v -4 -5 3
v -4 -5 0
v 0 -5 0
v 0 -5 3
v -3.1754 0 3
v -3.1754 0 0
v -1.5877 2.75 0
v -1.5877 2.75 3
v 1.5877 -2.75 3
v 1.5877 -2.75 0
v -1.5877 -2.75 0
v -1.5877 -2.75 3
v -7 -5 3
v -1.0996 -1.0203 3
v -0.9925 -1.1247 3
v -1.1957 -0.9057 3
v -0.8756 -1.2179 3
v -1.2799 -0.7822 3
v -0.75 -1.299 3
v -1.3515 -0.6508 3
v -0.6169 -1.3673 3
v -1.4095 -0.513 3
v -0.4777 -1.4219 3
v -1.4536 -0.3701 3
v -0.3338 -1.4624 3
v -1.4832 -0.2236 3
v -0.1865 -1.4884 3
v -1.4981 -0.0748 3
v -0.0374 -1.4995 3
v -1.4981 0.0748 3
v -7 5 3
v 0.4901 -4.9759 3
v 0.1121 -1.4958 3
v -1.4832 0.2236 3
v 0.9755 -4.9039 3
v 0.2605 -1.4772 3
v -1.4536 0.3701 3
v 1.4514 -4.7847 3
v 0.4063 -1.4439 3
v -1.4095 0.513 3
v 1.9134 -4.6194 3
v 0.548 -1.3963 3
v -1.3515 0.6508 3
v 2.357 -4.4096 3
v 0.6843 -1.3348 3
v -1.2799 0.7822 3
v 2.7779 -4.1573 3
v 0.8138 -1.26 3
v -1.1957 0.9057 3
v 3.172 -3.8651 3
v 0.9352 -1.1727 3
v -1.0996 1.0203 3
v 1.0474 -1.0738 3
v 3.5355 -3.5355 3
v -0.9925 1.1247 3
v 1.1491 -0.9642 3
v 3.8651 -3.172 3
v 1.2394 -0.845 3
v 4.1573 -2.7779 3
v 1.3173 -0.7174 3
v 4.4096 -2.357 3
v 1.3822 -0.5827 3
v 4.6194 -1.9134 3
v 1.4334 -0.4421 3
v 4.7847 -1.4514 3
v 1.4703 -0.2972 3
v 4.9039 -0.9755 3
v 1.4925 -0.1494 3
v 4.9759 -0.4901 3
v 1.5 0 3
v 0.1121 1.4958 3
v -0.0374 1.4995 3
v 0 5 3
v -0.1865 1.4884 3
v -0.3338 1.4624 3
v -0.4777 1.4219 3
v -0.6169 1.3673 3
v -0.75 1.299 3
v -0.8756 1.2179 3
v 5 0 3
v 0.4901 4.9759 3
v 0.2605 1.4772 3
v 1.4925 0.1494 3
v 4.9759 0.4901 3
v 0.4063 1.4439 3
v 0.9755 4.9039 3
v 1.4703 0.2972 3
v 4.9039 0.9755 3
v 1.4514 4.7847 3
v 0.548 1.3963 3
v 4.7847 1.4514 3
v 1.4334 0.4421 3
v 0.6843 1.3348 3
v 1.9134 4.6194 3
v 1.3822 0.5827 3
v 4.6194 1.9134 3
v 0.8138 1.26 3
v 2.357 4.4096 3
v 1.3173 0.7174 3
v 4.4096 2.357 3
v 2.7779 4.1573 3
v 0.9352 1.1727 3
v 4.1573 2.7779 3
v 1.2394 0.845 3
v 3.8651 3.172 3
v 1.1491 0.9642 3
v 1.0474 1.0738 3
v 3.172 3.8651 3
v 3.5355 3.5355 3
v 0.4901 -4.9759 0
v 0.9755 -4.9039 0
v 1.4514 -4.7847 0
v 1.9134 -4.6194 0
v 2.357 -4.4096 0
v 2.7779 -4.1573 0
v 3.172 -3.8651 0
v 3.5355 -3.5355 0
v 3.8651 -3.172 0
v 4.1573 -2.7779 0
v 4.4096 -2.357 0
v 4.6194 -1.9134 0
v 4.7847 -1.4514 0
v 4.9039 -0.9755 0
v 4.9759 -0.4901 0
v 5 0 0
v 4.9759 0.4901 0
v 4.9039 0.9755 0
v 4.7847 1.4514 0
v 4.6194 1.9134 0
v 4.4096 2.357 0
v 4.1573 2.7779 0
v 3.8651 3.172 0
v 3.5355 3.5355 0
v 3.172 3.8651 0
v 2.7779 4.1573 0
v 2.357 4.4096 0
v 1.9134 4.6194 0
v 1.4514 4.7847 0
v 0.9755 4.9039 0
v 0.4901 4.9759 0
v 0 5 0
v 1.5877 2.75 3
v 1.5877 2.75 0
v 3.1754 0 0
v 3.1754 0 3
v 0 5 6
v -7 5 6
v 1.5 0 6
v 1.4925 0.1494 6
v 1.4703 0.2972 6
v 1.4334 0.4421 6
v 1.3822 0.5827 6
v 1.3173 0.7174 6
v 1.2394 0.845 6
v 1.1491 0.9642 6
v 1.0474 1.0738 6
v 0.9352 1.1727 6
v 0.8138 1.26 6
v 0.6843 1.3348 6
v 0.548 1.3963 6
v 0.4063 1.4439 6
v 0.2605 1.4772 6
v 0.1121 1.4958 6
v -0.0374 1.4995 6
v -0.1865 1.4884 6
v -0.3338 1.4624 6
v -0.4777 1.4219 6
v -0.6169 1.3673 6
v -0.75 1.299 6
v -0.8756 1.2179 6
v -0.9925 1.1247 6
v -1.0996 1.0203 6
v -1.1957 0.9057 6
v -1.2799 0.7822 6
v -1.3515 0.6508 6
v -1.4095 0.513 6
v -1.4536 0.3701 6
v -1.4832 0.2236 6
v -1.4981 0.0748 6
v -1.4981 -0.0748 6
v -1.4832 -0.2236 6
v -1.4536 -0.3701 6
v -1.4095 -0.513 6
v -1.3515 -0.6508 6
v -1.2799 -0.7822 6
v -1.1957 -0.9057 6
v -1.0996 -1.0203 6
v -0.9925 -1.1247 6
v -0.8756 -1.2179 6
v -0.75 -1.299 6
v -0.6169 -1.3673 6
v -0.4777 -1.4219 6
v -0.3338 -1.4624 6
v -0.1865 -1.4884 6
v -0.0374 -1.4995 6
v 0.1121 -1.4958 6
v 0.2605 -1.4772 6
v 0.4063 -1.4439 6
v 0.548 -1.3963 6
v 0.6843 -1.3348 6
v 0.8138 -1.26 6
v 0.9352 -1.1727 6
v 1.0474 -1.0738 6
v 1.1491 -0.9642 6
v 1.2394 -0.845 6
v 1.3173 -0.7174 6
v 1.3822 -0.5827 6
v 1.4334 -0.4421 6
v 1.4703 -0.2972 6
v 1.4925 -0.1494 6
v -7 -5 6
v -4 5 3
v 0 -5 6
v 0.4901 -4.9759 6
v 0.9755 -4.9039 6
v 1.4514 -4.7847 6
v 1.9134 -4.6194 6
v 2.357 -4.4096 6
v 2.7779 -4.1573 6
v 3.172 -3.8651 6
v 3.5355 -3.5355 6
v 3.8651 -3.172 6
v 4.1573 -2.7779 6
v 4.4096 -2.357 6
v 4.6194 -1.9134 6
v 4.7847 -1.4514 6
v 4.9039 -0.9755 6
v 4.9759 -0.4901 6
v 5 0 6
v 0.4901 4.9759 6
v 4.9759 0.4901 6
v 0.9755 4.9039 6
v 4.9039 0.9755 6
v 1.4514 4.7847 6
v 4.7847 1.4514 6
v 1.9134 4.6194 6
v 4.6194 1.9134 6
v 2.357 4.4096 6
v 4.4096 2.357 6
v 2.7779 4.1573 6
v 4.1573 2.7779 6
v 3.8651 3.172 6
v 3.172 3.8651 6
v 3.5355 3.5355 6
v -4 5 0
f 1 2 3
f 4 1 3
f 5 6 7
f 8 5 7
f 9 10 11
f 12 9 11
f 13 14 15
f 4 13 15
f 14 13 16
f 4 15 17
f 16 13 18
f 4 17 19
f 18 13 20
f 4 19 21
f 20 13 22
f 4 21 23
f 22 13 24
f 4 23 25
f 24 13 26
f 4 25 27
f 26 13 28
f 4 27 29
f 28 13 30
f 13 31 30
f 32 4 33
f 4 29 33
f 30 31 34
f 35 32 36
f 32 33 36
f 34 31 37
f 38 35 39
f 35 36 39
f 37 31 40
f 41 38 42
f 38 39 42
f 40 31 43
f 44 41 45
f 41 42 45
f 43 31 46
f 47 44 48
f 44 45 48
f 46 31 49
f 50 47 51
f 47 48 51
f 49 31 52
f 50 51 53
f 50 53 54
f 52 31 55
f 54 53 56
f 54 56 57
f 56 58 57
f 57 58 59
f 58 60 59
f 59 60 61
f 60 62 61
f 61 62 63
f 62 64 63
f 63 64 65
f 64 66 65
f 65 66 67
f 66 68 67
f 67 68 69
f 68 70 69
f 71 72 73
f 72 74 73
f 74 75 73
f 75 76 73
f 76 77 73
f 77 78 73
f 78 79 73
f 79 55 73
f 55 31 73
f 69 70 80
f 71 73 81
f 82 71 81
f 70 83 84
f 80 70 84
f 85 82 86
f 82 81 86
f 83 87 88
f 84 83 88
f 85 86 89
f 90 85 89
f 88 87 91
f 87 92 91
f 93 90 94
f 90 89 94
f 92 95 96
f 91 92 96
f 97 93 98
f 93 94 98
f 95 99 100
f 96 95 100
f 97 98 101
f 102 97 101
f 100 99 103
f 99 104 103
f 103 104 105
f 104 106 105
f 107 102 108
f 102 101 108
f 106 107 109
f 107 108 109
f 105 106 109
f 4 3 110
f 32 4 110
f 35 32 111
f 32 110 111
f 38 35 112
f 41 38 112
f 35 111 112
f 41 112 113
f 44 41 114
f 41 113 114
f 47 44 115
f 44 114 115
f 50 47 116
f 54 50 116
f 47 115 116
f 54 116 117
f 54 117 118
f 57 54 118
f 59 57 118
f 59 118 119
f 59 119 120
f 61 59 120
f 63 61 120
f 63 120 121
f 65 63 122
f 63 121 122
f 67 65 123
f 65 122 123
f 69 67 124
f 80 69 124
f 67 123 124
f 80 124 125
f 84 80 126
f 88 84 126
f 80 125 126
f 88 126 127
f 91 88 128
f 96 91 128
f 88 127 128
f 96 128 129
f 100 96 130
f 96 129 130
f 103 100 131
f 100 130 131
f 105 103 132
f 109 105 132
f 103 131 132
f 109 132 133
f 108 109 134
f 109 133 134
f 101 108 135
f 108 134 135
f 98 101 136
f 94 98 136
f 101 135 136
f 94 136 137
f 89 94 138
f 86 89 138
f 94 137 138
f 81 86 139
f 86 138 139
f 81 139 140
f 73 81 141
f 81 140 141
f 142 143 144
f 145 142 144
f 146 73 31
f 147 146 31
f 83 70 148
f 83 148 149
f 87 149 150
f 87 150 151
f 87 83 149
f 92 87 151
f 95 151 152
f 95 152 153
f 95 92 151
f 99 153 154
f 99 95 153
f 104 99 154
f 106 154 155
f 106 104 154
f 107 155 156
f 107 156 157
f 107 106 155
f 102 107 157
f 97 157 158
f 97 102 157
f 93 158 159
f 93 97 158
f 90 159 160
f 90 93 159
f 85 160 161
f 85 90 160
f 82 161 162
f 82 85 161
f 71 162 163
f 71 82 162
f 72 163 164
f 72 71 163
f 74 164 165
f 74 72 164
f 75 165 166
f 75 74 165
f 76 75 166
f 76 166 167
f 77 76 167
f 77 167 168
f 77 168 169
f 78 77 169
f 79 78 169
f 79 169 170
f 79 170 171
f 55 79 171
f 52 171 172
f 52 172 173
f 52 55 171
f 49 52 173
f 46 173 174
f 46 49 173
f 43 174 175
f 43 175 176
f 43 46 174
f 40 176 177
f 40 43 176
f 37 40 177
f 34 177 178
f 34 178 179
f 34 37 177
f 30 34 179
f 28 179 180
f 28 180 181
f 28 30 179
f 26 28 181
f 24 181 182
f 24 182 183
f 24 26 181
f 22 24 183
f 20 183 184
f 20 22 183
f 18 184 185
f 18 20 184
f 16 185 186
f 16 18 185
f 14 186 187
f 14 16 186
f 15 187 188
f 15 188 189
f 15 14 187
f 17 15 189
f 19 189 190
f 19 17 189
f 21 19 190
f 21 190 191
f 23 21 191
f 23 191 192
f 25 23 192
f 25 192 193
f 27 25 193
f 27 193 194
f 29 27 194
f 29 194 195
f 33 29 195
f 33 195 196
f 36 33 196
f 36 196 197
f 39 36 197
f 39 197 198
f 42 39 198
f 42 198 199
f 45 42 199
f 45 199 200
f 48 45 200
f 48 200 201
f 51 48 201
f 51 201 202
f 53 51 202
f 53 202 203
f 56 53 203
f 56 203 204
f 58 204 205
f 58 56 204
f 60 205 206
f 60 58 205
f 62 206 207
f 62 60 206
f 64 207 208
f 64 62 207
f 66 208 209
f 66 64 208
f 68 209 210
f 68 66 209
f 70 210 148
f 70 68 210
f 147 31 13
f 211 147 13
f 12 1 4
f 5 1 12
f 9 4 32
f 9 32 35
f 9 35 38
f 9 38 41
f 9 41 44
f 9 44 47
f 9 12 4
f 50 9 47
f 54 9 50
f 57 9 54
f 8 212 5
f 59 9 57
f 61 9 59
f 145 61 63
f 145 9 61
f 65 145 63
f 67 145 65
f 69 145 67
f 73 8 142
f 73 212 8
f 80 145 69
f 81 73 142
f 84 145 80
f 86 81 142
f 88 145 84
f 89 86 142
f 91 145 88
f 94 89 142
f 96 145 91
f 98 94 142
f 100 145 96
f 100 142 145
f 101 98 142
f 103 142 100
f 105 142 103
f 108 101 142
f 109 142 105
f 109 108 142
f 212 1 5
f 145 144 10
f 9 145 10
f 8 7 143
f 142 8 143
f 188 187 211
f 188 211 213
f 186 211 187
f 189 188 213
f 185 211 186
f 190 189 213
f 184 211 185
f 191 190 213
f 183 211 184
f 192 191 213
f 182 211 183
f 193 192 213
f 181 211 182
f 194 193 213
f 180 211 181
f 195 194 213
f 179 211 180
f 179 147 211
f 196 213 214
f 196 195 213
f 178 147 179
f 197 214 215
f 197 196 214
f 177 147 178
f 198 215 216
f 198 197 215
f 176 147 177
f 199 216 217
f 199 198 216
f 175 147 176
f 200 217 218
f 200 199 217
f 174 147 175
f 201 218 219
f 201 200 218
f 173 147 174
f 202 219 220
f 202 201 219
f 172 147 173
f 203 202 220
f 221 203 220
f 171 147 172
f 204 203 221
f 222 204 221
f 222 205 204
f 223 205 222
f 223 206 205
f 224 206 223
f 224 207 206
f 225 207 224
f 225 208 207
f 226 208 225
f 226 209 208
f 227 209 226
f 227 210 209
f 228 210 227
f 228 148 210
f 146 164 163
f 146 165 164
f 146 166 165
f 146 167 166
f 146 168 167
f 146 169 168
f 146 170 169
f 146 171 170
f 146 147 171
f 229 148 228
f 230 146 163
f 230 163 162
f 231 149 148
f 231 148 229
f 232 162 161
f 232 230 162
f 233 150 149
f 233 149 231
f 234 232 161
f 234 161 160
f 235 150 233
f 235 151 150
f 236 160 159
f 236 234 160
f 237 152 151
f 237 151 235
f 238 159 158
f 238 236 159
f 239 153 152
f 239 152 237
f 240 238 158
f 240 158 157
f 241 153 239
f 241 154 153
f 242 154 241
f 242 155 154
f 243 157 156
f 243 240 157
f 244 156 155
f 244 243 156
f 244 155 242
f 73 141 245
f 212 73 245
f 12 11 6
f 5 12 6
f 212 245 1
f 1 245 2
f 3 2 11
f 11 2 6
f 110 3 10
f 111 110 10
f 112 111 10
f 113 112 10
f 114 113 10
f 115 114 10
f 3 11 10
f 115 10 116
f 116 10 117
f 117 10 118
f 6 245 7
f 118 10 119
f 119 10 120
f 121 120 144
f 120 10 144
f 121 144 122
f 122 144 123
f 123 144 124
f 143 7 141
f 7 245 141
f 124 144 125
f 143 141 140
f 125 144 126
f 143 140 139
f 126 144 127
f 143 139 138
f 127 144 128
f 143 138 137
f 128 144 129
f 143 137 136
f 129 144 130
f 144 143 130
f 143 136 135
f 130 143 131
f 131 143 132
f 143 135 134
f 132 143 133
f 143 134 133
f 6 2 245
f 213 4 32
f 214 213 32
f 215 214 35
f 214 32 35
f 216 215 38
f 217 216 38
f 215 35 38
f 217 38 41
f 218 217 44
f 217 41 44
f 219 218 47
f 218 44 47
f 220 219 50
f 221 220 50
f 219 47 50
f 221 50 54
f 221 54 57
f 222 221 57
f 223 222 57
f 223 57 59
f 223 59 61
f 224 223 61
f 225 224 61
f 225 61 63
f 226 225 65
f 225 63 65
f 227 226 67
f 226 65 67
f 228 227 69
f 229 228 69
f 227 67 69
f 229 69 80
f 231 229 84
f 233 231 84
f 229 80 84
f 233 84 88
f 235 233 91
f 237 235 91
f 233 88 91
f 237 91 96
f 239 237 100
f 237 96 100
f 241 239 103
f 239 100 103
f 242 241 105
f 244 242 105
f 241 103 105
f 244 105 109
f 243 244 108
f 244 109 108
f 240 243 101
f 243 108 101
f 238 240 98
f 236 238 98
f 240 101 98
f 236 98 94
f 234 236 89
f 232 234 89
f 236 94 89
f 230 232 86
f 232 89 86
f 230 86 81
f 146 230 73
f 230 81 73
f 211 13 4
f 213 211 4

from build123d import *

# Parameters (mm, degrees)
F2_DEPTH = 3
F3_R     = 1.5
F4_DEPTH = 3


with BuildPart() as f2:
    # F1 (on Top) → F2 (new body)
    with BuildSketch(Plane.XY):
        with BuildLine():
            ThreePointArc((0, -5), (5, 0), (0, 5))
            Line((0, 5), (-4, 5))
            Line((-4, 5), (-4, -5))
            Line((-4, -5), (0, -5))
        make_face()
        Polygon((1.5877132403, 2.75), (3.1754264805, 0), (1.5877132403, -2.75), (-1.5877132403, -2.75), (-3.1754264805, 0), (-1.5877132403, 2.75), align=None, mode=Mode.SUBTRACT)
    extrude(amount=F2_DEPTH)


with BuildPart() as f4:
    # F3 (on face) → F4 (new body)
    with BuildSketch(Plane.XY.offset(3)):
        with BuildLine():
            ThreePointArc((0, -5), (5, 0), (0, 5))
            Line((0, 5), (-4, 5))
            Line((-4, 5), (-7, 5))
            Line((-7, 5), (-7, -5))
            Line((-7, -5), (-4, -5))
            Line((-4, -5), (0, -5))
        make_face()
        Circle(F3_R, mode=Mode.SUBTRACT)
    extrude(amount=F4_DEPTH)


solid = Compound([f2.part, f4.part])
